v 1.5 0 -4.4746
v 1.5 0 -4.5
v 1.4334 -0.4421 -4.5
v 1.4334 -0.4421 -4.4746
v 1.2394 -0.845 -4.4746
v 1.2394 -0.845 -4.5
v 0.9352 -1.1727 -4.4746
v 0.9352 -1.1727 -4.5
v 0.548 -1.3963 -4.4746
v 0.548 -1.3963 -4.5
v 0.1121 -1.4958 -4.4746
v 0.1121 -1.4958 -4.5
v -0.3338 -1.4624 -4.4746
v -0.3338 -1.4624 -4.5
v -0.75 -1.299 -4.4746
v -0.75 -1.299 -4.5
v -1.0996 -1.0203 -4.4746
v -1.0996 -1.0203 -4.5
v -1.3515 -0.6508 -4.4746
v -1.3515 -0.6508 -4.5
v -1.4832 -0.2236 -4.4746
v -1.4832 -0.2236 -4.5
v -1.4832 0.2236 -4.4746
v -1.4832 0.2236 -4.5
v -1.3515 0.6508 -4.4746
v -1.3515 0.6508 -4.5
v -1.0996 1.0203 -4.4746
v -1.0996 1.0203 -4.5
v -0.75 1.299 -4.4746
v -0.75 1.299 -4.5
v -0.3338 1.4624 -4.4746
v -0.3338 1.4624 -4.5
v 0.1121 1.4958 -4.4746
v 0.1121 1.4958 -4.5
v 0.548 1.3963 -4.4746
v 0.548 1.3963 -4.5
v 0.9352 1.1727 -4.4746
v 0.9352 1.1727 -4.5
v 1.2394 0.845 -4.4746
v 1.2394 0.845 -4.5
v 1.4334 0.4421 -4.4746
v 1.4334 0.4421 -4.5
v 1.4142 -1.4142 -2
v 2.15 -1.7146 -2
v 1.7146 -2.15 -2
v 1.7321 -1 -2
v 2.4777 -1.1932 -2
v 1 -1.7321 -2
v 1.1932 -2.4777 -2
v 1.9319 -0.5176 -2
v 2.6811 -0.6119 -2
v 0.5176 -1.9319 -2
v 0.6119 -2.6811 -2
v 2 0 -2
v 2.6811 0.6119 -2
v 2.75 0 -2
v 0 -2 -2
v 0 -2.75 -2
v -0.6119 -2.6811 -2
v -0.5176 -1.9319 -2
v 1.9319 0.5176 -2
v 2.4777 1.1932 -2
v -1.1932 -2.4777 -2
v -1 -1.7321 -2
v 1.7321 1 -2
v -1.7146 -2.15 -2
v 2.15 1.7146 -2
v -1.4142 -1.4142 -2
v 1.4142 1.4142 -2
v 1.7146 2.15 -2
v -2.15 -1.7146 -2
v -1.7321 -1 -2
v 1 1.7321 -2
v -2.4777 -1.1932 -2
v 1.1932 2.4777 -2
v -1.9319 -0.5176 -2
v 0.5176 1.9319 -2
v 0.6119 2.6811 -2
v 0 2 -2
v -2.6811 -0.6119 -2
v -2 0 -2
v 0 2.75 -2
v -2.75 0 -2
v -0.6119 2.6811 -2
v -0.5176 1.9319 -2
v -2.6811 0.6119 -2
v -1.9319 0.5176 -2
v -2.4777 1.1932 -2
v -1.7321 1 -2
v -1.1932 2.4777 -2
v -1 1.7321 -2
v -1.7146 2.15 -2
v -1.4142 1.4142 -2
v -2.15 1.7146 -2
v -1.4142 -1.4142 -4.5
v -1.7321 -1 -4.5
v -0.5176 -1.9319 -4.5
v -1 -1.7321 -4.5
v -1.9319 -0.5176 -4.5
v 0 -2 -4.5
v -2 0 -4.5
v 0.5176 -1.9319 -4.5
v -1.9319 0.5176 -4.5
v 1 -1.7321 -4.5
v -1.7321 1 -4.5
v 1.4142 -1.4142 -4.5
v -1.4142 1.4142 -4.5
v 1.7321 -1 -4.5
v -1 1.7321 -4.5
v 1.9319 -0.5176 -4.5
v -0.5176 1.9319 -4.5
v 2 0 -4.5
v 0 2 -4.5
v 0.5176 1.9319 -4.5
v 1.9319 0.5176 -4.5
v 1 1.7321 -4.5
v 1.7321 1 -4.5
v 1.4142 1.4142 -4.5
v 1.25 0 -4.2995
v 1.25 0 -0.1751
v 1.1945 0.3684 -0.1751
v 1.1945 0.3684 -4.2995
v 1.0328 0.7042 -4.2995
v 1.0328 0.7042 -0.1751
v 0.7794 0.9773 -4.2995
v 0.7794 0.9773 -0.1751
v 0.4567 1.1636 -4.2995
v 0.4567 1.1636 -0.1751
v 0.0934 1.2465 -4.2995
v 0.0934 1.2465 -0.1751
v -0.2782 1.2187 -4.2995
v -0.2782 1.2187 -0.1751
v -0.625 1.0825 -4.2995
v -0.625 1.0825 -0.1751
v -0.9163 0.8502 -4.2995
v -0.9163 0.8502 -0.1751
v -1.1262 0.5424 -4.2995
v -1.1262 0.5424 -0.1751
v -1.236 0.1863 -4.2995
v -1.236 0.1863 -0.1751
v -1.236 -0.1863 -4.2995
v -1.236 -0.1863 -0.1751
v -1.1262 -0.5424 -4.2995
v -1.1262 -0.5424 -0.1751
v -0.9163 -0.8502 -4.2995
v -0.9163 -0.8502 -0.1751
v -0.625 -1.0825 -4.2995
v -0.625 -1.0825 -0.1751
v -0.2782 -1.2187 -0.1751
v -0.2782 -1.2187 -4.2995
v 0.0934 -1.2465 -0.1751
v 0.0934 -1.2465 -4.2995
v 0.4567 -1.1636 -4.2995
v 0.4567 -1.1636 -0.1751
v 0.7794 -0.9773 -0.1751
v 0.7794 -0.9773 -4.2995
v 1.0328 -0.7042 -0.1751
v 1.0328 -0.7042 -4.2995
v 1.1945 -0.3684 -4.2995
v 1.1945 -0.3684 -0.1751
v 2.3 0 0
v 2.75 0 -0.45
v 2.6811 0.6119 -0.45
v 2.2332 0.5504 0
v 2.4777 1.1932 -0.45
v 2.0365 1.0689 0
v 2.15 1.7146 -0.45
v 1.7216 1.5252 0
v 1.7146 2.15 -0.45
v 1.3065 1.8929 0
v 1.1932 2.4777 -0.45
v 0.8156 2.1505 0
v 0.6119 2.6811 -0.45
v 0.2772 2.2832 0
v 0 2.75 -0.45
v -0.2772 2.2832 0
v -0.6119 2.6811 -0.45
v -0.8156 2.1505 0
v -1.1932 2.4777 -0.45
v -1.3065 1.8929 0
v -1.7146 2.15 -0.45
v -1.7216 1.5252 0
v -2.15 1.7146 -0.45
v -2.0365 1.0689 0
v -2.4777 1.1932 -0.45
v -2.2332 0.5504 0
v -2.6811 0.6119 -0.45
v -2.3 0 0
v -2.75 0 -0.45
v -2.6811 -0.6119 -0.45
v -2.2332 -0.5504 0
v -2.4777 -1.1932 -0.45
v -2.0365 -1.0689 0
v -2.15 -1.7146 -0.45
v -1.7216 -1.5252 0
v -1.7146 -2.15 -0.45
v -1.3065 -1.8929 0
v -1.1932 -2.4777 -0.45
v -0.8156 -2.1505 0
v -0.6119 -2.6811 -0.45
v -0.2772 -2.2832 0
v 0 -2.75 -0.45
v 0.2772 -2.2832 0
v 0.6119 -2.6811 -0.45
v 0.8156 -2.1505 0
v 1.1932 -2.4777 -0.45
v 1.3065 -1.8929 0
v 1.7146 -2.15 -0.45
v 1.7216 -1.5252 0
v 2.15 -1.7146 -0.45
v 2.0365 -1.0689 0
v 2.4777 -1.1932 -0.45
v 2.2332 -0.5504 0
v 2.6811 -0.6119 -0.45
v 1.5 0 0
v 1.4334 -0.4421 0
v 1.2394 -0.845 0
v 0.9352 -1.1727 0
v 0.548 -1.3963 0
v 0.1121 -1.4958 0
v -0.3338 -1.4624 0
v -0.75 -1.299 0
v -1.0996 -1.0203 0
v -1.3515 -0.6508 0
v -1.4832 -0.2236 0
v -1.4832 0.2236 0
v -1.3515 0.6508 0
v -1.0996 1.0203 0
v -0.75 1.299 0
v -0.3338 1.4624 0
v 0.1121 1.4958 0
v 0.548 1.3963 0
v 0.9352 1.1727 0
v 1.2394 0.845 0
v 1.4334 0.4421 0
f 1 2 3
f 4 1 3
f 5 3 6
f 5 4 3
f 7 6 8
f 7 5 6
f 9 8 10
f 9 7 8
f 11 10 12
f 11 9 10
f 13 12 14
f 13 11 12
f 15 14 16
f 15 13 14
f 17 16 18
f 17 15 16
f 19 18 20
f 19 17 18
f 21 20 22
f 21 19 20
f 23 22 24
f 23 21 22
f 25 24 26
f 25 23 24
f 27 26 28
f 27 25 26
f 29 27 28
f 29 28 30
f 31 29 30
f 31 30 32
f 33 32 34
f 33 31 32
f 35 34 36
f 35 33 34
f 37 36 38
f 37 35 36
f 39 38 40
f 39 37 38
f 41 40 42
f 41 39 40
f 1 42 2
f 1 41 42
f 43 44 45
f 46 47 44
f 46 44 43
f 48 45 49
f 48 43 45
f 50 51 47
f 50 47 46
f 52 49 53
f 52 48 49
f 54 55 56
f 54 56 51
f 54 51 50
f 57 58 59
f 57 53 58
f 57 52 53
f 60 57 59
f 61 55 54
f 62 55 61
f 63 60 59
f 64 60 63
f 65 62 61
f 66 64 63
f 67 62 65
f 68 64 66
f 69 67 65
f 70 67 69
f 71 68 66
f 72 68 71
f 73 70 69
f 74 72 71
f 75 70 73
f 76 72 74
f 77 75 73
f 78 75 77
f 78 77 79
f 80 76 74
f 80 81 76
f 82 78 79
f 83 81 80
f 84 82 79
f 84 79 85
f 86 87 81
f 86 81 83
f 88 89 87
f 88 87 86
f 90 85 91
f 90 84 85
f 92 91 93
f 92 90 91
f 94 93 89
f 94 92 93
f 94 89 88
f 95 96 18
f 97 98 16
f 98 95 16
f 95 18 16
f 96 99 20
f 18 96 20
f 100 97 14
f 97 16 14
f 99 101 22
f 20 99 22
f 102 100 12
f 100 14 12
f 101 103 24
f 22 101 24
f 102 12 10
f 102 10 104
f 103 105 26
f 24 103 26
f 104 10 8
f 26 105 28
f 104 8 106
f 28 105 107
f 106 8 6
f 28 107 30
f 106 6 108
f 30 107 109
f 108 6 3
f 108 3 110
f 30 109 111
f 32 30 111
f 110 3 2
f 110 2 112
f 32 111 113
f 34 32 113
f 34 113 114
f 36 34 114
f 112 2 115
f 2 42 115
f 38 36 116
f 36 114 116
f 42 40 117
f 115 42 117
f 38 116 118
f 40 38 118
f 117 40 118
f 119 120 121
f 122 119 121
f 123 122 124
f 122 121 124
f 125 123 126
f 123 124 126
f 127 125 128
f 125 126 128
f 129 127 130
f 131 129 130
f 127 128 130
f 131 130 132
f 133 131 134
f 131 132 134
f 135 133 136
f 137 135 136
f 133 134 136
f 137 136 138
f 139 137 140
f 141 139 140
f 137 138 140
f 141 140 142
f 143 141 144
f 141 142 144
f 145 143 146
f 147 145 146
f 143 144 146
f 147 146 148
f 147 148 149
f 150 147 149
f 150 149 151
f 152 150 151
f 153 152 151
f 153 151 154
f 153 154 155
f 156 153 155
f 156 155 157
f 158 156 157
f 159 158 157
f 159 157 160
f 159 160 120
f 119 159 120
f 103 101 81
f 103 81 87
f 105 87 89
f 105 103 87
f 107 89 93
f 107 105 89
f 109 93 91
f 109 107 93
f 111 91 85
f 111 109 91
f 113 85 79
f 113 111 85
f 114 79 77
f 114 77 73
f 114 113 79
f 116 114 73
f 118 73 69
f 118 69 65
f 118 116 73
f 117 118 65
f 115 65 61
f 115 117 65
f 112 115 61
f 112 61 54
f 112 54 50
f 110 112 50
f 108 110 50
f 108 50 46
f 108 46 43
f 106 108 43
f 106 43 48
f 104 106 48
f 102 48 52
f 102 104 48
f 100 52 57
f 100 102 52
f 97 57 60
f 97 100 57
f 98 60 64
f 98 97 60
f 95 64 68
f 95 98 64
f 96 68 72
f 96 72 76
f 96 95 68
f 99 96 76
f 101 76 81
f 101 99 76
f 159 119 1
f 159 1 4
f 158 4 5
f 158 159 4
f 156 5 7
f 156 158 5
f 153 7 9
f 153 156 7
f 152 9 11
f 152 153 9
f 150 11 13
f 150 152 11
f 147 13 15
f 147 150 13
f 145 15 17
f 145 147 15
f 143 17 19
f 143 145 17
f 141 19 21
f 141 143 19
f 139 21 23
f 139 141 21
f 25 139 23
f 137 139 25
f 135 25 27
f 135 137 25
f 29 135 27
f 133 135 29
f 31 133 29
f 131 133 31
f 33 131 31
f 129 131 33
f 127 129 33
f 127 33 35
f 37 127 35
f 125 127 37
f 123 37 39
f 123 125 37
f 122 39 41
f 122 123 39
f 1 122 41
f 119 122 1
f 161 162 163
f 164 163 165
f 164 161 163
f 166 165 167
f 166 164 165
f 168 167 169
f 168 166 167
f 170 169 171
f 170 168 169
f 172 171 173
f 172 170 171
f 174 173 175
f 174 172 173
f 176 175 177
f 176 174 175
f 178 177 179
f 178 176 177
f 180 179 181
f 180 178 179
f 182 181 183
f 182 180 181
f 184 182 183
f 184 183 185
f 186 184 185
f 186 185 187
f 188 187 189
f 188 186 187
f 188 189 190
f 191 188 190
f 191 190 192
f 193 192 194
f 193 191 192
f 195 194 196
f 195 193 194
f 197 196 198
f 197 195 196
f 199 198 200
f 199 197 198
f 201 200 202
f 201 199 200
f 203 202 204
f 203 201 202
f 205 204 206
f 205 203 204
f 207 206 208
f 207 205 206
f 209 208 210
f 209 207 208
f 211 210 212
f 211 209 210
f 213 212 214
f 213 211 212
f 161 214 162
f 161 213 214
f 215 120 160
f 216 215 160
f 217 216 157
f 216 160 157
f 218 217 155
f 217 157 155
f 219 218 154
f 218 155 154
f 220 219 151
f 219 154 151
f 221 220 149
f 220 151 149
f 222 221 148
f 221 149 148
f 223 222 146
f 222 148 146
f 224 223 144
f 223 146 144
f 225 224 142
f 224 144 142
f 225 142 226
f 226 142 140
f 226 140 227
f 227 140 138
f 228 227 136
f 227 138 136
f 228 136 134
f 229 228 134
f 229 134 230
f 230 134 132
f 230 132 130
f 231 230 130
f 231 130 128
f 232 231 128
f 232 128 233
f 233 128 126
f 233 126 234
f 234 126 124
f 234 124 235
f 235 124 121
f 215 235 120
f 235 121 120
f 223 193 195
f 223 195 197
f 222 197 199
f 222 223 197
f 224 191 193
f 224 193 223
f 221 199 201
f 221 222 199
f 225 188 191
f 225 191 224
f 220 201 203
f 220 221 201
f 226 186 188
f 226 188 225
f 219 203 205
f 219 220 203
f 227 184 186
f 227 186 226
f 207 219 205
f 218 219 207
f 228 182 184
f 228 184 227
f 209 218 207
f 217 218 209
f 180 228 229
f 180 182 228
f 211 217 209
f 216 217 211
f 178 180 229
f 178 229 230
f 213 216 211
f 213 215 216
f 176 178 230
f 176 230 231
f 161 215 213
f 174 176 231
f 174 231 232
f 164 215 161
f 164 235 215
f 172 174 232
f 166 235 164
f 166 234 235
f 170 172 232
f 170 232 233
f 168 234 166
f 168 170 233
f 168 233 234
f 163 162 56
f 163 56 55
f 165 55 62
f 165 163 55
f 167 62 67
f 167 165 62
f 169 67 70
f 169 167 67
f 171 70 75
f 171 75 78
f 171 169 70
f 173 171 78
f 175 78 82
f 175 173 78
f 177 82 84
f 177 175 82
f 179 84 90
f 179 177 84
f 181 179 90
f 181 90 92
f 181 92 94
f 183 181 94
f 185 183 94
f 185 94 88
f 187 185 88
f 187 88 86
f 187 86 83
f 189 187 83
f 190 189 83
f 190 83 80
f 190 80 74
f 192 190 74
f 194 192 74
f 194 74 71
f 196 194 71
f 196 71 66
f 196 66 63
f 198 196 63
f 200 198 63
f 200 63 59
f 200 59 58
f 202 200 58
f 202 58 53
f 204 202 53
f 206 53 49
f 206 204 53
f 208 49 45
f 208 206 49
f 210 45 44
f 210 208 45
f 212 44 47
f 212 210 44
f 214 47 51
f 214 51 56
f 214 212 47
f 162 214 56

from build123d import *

# Parameters (mm, degrees)
BASENUTSKE_R       = 2.75
BASENUTSKE_R_2     = 1.25
BASENUT_DEPTH      = 4.5
CHAMFER1_SIZE      = 0.45
SKETCH1_OUTSIDE_W  = 9.298
SKETCH1_OUTSIDE_H  = 9.298
SKETCH1_OUTSIDE_R  = 2
CUT_EXTRUDE1_DEPTH = 2.5


with BuildPart() as part:
    # BaseNutSke → BaseNut (new body)
    with BuildSketch(Plane.XY):
        Circle(BASENUTSKE_R)
        Circle(BASENUTSKE_R_2, mode=Mode.SUBTRACT)
    extrude(amount=-BASENUT_DEPTH)

    # EndChSke (on Right Plane) → EndChamfer (revolve, cut)
    with BuildSketch(Plane(origin=(0, 0, 0), x_dir=(0, 0, -1), z_dir=(1, 0, 0)), mode=Mode.PRIVATE) as endchamfer_sk:
        Polygon((4.4746, 1.5), (4.282042927, 1.225), (4.5254, 1.225), (4.5254, 1.5), align=None)
        Polygon((-0.0508, 1.5), (0, 1.5), (0.192557073, 1.225), (-0.0508, 1.225), align=None)
    revolve(endchamfer_sk.sketch.rotate(Axis((0, 0, -25.037505729), (0, 0, -1)), 90), axis=Axis((0, 0, -25.037505729), (0, 0, -1)), mode=Mode.SUBTRACT)

    # Chamfer1
    chamfer1_edges = [part.edges().sort_by_distance(p)[0] for p in [
        (-2.75, 0, 0),
    ]]
    chamfer(chamfer1_edges, length=CHAMFER1_SIZE)

    # Sketch1 outside → Cut-Extrude1 (cut)
    with BuildSketch(Plane(origin=(0, 0, -4.5), x_dir=(-1, 0, 0), z_dir=(0, 0, -1))):
        Rectangle(SKETCH1_OUTSIDE_W, SKETCH1_OUTSIDE_H)
        Circle(SKETCH1_OUTSIDE_R, mode=Mode.SUBTRACT)
    extrude(amount=-CUT_EXTRUDE1_DEPTH, mode=Mode.SUBTRACT)


solid = part.part
